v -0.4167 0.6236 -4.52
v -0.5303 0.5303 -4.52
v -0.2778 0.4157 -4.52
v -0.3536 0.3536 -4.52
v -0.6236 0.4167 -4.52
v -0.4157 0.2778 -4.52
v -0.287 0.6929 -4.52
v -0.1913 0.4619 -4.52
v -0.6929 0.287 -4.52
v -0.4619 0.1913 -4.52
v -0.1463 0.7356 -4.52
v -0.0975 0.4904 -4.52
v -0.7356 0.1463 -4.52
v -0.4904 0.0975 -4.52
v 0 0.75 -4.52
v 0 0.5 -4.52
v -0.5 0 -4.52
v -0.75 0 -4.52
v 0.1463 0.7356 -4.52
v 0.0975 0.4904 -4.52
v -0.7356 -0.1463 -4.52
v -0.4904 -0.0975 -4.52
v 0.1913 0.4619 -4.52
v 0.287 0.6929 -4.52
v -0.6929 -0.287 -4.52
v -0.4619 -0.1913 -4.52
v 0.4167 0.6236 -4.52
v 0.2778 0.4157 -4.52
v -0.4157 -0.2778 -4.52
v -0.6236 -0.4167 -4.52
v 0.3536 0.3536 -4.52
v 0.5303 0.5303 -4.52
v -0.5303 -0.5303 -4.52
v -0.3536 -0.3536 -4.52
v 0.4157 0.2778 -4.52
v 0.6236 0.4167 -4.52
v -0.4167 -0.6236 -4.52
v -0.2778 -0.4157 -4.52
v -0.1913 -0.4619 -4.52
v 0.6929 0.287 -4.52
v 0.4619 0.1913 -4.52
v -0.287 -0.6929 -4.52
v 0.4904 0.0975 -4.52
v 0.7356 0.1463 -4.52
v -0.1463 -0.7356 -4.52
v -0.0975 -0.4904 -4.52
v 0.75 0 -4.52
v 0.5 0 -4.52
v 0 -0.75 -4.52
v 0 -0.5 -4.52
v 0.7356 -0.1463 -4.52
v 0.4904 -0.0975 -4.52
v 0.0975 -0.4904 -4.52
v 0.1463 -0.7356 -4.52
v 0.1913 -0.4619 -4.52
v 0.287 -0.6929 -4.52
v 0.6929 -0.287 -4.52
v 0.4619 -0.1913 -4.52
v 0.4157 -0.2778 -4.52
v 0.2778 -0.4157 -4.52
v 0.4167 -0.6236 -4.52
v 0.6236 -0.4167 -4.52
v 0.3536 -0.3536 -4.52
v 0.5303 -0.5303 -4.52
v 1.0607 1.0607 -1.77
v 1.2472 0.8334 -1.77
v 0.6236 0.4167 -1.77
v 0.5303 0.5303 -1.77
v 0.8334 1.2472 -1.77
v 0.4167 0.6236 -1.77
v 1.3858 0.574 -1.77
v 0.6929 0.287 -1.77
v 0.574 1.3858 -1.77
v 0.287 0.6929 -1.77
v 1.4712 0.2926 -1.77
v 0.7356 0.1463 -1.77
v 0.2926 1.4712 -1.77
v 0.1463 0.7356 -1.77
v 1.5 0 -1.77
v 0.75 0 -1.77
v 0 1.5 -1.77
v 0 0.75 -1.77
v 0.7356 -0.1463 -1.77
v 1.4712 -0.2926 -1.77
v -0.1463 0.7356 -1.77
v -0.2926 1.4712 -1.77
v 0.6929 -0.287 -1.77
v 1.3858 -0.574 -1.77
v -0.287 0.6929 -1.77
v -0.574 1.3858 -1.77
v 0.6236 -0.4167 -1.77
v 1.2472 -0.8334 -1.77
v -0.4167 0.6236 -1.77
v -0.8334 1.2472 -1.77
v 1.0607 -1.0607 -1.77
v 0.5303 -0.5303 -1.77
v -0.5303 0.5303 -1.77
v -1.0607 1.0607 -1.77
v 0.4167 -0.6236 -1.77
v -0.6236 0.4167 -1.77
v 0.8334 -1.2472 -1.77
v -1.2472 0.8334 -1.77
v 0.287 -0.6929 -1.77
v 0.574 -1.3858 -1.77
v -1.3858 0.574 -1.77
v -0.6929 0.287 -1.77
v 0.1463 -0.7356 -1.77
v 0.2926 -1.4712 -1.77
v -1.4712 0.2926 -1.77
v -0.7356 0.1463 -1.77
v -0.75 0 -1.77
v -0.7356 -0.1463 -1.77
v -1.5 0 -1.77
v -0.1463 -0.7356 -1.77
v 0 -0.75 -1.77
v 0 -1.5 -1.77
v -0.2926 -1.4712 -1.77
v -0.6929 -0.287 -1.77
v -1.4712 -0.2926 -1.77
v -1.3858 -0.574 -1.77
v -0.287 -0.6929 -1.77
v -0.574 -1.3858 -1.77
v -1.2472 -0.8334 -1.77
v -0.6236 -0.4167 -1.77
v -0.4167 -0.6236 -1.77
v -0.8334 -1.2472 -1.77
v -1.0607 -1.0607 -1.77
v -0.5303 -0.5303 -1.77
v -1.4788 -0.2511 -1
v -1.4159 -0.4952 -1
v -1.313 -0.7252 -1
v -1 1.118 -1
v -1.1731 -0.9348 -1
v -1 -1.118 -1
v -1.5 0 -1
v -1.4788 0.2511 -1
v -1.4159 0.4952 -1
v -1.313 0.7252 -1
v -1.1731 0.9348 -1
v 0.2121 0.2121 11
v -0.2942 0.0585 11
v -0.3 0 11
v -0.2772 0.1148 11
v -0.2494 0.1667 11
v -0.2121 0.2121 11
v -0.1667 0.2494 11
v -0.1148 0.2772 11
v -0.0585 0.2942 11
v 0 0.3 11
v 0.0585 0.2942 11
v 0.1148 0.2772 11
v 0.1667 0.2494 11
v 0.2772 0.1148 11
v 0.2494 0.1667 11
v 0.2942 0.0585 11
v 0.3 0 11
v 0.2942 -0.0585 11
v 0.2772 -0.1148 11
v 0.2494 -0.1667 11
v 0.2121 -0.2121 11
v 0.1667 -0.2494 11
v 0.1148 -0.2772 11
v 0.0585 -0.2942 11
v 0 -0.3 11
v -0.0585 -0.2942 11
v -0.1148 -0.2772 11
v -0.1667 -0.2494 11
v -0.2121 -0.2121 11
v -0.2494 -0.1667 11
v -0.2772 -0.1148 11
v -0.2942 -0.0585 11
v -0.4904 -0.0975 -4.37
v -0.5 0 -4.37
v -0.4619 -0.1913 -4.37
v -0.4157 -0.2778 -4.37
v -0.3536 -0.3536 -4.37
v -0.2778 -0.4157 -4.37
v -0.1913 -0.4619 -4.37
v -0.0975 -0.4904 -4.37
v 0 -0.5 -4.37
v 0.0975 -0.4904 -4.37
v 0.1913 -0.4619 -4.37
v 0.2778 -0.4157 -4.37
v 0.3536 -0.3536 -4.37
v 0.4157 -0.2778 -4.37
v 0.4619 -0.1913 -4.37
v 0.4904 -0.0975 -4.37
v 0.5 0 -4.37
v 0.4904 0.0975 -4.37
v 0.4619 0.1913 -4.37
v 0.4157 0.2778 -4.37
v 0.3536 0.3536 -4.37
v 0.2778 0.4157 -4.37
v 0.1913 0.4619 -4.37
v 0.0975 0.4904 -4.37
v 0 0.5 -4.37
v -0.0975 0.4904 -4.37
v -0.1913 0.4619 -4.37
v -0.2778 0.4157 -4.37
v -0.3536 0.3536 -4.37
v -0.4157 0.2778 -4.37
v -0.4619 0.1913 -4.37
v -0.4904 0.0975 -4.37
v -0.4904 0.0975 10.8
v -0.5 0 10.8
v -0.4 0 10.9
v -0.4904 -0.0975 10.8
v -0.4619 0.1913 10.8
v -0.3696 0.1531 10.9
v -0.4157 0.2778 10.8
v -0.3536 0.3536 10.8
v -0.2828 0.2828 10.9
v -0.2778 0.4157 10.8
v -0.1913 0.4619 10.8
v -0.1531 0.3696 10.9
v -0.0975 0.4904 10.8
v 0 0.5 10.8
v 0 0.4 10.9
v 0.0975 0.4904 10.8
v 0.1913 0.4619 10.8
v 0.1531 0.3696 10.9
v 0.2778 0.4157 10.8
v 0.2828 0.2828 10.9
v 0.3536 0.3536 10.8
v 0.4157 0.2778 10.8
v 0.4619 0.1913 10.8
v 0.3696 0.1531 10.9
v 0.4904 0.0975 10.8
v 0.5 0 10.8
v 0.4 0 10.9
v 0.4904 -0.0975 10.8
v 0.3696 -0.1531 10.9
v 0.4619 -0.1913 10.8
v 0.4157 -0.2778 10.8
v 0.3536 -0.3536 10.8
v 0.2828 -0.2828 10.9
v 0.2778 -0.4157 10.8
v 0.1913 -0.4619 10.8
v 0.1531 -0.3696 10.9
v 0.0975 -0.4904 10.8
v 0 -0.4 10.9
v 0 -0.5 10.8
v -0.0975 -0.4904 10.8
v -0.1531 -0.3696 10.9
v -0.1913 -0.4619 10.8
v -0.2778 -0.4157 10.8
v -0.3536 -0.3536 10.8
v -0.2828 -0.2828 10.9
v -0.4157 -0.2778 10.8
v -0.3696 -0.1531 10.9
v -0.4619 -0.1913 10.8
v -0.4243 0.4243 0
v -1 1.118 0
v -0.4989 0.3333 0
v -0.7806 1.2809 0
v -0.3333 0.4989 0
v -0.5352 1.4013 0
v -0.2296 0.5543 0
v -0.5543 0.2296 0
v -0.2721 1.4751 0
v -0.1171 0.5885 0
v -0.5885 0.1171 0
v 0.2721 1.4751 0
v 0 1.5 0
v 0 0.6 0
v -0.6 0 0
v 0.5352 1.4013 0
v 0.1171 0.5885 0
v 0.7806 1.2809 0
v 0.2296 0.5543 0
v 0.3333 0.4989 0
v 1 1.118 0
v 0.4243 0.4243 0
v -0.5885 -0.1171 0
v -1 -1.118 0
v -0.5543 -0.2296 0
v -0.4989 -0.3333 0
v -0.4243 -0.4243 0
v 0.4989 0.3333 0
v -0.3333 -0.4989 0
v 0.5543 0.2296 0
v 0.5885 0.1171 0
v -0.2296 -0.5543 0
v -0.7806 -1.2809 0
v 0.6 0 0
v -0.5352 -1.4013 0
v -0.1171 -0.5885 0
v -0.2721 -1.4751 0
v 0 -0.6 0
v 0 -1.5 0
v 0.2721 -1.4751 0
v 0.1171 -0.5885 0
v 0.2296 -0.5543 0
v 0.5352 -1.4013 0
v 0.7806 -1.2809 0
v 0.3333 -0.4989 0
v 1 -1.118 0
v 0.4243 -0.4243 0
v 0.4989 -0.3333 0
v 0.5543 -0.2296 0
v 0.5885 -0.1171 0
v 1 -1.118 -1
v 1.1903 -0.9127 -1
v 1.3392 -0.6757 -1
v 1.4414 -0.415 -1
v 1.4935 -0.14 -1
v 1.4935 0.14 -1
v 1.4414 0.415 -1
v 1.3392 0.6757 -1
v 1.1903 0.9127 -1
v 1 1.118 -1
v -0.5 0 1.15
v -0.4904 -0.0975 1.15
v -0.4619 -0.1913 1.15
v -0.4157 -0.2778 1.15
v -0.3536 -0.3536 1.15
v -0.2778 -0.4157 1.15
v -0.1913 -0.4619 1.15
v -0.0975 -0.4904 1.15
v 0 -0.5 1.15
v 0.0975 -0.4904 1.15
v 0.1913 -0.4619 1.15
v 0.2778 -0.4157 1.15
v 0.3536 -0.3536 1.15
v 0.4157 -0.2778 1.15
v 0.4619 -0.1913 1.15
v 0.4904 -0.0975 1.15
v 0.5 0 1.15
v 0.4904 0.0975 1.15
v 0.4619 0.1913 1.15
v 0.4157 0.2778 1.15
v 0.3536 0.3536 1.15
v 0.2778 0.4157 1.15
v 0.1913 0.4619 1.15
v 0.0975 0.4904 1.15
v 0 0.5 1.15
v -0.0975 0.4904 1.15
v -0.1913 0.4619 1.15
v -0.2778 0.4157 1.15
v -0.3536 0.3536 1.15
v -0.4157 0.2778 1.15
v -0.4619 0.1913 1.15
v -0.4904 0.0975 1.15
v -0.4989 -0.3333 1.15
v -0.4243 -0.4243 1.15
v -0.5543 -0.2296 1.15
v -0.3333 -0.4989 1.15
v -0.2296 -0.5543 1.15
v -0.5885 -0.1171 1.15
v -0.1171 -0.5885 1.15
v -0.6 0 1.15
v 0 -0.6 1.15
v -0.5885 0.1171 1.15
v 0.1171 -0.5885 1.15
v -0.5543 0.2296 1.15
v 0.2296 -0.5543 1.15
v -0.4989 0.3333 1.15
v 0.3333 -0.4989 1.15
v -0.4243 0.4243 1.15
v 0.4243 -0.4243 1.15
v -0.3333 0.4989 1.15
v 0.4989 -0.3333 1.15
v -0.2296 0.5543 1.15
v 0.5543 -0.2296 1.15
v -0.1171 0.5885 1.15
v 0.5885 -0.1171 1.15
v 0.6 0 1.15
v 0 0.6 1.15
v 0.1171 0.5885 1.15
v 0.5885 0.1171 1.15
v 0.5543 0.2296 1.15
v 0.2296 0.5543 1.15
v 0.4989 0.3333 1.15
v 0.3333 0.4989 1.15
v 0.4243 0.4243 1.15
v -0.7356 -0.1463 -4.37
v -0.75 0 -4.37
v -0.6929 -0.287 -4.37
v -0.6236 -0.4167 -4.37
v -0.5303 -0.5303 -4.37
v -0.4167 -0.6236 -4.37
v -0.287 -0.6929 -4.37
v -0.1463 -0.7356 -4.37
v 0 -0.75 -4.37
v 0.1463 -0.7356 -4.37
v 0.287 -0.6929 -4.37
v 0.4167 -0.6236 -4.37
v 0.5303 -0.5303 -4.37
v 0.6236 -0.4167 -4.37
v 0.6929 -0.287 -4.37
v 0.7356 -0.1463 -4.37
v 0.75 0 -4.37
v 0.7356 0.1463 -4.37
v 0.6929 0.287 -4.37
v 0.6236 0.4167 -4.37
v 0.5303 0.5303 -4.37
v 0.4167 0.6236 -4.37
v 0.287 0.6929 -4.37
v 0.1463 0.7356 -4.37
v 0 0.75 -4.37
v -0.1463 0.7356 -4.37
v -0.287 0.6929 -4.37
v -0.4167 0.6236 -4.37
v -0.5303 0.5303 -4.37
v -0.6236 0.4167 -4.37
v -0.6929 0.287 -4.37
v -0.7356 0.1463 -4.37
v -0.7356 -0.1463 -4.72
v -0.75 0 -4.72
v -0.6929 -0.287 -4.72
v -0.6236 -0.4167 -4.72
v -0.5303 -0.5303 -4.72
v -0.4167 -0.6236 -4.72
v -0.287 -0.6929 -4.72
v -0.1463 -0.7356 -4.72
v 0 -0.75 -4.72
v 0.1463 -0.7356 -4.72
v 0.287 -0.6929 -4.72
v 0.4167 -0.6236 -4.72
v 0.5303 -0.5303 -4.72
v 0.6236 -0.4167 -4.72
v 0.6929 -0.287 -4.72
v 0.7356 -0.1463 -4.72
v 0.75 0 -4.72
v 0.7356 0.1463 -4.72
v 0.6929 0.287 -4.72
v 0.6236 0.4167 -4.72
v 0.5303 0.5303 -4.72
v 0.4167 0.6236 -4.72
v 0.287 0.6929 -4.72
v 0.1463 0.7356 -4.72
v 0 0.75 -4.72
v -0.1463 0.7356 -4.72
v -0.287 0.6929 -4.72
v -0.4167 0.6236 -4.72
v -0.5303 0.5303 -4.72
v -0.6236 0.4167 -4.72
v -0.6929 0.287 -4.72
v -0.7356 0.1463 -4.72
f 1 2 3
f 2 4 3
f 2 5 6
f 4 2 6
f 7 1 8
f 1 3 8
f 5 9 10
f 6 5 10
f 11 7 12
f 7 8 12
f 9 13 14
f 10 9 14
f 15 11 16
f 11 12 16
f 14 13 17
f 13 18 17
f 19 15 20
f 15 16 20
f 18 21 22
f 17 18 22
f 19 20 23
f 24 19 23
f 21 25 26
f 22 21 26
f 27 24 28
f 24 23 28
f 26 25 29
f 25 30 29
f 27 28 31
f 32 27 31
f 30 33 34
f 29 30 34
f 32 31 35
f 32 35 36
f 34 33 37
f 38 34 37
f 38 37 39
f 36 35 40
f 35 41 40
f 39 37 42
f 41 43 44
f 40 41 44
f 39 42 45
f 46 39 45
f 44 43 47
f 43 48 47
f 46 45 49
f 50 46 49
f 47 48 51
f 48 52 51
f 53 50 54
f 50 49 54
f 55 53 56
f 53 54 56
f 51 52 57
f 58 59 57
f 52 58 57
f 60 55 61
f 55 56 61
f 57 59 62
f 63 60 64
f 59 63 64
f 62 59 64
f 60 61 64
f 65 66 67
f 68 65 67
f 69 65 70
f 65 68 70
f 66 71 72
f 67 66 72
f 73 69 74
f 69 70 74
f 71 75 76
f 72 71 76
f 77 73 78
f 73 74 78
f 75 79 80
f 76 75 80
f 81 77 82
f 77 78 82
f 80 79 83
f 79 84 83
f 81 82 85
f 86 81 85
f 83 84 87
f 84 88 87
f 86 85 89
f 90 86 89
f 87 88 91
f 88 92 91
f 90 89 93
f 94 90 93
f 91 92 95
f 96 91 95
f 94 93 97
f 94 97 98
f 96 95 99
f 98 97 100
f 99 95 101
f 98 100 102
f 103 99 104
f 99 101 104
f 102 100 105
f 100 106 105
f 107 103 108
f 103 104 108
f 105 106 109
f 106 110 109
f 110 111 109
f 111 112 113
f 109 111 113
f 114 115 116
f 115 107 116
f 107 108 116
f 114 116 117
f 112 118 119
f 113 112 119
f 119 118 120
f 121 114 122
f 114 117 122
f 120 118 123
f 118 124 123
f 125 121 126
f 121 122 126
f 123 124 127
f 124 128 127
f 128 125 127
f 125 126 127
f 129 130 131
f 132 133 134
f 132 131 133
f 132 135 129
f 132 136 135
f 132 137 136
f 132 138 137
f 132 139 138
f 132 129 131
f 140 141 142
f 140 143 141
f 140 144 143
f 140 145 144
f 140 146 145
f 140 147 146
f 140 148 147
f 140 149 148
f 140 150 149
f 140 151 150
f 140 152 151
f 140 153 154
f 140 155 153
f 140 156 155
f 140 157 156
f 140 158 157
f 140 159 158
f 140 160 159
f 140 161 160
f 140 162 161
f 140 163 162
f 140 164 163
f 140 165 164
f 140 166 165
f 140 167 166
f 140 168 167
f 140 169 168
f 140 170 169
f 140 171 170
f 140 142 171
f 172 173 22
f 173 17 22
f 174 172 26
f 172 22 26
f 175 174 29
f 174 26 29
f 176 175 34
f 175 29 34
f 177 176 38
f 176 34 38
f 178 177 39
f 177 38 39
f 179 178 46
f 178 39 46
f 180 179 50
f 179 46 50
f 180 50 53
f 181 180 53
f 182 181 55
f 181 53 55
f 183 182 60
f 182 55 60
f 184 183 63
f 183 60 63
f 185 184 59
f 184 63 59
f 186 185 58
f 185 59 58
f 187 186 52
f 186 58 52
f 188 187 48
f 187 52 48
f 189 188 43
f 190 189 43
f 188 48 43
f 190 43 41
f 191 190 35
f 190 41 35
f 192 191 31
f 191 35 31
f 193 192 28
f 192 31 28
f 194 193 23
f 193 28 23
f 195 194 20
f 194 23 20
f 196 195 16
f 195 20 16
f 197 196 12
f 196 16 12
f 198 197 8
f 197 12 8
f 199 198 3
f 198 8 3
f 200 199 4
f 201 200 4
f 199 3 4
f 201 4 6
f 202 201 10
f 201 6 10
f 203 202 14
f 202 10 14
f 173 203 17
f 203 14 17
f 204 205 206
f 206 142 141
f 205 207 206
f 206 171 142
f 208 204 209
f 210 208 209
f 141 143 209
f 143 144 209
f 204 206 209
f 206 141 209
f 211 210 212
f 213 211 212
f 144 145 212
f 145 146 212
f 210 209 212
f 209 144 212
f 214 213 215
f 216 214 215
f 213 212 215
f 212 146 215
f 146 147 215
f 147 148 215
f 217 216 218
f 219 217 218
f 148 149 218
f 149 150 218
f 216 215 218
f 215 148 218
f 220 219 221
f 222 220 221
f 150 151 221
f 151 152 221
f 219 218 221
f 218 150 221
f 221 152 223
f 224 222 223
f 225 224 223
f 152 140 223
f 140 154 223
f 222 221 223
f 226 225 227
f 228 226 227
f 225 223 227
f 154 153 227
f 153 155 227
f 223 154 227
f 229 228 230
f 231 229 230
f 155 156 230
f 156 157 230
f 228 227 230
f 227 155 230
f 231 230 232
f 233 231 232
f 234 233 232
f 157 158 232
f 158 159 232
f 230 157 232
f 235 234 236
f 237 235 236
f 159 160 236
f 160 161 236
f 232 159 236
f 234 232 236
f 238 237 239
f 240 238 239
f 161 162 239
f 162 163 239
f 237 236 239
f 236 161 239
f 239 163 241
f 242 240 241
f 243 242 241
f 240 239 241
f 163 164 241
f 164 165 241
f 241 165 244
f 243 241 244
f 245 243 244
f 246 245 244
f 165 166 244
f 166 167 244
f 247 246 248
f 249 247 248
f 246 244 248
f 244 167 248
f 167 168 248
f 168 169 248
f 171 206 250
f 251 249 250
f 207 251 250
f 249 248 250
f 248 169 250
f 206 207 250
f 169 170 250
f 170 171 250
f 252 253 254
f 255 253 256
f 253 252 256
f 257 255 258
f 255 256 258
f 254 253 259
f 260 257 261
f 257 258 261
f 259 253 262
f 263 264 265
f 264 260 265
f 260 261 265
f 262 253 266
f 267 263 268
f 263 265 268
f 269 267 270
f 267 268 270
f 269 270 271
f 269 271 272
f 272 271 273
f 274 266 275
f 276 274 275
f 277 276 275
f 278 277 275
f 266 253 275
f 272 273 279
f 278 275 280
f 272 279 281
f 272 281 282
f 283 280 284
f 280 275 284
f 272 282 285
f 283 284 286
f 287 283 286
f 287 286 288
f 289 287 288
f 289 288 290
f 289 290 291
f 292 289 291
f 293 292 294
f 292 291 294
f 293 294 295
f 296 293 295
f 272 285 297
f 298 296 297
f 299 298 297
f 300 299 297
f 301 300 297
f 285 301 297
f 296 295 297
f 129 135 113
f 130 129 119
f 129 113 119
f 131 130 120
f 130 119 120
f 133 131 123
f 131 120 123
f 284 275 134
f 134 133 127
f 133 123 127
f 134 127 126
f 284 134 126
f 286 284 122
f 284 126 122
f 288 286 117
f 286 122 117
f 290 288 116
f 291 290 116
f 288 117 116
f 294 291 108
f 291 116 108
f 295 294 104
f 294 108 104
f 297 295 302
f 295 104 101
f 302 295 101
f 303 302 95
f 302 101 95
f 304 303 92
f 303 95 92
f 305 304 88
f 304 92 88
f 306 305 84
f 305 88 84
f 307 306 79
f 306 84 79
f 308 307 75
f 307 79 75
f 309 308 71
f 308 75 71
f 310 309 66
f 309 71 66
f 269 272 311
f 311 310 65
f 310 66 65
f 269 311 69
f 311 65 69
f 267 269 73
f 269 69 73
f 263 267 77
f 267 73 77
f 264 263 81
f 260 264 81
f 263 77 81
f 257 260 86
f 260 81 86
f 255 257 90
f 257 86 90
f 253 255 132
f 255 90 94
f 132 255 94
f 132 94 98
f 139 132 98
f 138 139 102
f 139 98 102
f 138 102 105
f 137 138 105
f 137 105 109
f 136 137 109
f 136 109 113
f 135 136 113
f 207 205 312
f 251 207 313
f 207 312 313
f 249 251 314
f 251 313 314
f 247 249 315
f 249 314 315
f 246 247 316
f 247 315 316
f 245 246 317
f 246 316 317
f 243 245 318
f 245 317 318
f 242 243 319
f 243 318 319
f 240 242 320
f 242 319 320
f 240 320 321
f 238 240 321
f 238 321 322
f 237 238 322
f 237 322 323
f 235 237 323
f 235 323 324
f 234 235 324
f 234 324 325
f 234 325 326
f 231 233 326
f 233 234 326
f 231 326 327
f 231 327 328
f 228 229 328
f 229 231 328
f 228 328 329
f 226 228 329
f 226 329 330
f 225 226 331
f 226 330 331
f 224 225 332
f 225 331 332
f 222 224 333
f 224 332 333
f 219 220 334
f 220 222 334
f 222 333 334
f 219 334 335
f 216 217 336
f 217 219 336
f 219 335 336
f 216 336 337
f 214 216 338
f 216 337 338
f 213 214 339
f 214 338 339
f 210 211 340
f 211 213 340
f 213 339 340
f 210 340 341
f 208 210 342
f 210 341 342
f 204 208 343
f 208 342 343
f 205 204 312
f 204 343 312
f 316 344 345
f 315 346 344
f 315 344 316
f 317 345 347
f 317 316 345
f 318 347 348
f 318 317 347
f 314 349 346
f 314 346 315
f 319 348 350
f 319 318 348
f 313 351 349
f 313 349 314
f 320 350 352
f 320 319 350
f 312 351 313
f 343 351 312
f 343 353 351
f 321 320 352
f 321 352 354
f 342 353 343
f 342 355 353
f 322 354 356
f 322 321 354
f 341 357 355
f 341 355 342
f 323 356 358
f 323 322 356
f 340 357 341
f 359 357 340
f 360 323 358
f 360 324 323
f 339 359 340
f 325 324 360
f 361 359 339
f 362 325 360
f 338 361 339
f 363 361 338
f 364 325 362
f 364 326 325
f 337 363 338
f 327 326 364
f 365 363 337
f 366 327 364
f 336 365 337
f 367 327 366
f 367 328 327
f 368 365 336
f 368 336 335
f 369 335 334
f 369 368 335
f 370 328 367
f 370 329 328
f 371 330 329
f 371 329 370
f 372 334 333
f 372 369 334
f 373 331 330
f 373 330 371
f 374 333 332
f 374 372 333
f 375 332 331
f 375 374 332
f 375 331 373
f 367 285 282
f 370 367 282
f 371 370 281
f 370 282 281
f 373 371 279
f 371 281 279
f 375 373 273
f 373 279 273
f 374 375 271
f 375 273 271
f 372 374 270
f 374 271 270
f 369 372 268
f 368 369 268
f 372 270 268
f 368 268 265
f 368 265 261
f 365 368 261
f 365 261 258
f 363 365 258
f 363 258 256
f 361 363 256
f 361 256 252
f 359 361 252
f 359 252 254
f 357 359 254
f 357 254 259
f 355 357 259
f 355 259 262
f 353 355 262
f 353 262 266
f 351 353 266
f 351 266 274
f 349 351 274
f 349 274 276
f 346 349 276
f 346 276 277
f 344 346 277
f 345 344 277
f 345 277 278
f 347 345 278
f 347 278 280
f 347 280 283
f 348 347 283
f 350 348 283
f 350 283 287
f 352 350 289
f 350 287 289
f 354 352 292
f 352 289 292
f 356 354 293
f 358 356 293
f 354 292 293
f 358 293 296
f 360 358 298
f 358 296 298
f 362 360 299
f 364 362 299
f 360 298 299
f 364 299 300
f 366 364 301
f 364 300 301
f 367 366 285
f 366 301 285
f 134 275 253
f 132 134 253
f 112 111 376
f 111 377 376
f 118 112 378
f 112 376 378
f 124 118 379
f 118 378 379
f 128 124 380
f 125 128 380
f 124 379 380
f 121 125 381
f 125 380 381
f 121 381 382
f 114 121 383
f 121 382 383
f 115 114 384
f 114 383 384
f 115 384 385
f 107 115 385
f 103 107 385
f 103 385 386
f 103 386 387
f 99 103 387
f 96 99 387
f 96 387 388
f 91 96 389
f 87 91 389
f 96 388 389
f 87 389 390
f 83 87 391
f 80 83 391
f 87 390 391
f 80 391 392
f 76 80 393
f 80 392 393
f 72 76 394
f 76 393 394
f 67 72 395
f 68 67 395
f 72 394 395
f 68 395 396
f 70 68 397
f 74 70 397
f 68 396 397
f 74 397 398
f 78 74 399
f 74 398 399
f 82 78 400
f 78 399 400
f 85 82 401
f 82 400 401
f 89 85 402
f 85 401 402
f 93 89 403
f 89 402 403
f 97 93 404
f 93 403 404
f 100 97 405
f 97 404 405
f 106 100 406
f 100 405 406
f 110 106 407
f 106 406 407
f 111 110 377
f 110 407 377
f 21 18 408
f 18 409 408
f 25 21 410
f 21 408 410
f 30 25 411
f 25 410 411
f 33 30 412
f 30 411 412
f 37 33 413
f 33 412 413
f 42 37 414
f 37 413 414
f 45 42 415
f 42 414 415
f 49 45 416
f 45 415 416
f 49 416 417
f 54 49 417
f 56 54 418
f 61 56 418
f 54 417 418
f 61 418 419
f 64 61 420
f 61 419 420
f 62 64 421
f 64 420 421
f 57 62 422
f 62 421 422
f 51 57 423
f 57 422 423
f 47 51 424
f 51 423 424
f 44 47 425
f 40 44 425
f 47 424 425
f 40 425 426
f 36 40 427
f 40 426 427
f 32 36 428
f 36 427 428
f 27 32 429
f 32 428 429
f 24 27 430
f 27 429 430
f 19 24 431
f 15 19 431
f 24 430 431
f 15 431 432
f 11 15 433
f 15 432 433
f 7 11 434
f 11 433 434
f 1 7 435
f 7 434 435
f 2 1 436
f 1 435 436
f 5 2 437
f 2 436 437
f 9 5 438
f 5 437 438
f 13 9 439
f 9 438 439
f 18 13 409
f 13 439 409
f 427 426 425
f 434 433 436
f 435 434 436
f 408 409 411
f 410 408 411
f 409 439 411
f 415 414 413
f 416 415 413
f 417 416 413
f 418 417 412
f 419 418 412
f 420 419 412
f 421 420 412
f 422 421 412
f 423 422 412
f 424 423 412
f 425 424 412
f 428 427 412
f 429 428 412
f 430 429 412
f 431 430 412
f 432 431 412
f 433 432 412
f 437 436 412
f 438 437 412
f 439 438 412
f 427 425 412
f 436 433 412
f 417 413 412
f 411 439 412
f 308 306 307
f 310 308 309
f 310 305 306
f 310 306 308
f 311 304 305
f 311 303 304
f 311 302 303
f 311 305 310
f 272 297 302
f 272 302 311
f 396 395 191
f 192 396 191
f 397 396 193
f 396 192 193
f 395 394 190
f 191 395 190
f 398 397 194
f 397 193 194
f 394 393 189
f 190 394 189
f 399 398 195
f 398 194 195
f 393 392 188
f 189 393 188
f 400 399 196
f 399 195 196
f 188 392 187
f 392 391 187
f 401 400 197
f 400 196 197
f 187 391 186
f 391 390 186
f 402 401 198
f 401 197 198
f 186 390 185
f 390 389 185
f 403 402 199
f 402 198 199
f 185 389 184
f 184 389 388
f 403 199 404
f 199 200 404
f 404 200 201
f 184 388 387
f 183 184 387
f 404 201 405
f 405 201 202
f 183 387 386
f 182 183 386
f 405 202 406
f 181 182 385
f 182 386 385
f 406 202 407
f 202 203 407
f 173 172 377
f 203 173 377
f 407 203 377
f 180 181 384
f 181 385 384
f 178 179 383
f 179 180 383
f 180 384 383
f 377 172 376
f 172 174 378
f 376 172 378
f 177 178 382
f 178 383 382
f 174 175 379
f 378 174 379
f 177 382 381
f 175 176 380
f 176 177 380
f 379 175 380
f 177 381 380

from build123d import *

# Parameters (mm, degrees)
SKETCH2_W           = 1
SKETCH2_H           = 3
CUT_EXTRUDE1_DEPTH  = 1
SKETCH3_R           = 0.6
BOSS_EXTRUDE1_DEPTH = 11
CUT_EXTRUDE2_START  = 1.15
SKETCH4_R           = 0.6
SKETCH4_R_2         = 0.5
CUT_EXTRUDE2_DEPTH  = 11.052678251
CHAMFER1_SIZE       = 0.2


with BuildPart() as part:
    # Sketch1 → Revolve1 (revolve)
    with BuildSketch(Plane(origin=(0, 0, 0), x_dir=(1, 0, 0), z_dir=(0, 1, 0))):
        Polygon((0, 0), (-1.5, 0), (-1.5, 1.77), (-0.75, 1.77), (-0.75, 4.37), (-0.5, 4.37), (-0.5, 4.52), (-0.75, 4.52), (-0.75, 4.72), (0, 4.72), align=None)
    revolve(axis=Axis((0, 0, -4.72), (0, 0, 1)))

    # Sketch2 → Cut-Extrude1 (cut)
    with BuildSketch(Plane.XY):
        with Locations((-1.5, 0)):
            Rectangle(SKETCH2_W, SKETCH2_H)
        with Locations((1.5, 0)):
            Rectangle(SKETCH2_W, SKETCH2_H)
    extrude(amount=-CUT_EXTRUDE1_DEPTH, mode=Mode.SUBTRACT)

    # Sketch3 → Boss-Extrude1 (add)
    with BuildSketch(Plane.XY):
        Circle(SKETCH3_R)
    extrude(amount=BOSS_EXTRUDE1_DEPTH)

    # Sketch4 → Cut-Extrude2 (cut, through all)
    with BuildSketch(Plane.XY.offset(CUT_EXTRUDE2_START)):
        Circle(SKETCH4_R)
        with Locations(Location((0, 0, 0), (0, 0, 180))):
            Circle(SKETCH4_R_2, mode=Mode.SUBTRACT)
    extrude(amount=CUT_EXTRUDE2_DEPTH, mode=Mode.SUBTRACT)

    # Chamfer1
    chamfer1_edges = [part.edges().sort_by_distance(p)[0] for p in [
        (0.5, 0, 11),
    ]]
    chamfer(chamfer1_edges, length=CHAMFER1_SIZE)


solid = part.part
